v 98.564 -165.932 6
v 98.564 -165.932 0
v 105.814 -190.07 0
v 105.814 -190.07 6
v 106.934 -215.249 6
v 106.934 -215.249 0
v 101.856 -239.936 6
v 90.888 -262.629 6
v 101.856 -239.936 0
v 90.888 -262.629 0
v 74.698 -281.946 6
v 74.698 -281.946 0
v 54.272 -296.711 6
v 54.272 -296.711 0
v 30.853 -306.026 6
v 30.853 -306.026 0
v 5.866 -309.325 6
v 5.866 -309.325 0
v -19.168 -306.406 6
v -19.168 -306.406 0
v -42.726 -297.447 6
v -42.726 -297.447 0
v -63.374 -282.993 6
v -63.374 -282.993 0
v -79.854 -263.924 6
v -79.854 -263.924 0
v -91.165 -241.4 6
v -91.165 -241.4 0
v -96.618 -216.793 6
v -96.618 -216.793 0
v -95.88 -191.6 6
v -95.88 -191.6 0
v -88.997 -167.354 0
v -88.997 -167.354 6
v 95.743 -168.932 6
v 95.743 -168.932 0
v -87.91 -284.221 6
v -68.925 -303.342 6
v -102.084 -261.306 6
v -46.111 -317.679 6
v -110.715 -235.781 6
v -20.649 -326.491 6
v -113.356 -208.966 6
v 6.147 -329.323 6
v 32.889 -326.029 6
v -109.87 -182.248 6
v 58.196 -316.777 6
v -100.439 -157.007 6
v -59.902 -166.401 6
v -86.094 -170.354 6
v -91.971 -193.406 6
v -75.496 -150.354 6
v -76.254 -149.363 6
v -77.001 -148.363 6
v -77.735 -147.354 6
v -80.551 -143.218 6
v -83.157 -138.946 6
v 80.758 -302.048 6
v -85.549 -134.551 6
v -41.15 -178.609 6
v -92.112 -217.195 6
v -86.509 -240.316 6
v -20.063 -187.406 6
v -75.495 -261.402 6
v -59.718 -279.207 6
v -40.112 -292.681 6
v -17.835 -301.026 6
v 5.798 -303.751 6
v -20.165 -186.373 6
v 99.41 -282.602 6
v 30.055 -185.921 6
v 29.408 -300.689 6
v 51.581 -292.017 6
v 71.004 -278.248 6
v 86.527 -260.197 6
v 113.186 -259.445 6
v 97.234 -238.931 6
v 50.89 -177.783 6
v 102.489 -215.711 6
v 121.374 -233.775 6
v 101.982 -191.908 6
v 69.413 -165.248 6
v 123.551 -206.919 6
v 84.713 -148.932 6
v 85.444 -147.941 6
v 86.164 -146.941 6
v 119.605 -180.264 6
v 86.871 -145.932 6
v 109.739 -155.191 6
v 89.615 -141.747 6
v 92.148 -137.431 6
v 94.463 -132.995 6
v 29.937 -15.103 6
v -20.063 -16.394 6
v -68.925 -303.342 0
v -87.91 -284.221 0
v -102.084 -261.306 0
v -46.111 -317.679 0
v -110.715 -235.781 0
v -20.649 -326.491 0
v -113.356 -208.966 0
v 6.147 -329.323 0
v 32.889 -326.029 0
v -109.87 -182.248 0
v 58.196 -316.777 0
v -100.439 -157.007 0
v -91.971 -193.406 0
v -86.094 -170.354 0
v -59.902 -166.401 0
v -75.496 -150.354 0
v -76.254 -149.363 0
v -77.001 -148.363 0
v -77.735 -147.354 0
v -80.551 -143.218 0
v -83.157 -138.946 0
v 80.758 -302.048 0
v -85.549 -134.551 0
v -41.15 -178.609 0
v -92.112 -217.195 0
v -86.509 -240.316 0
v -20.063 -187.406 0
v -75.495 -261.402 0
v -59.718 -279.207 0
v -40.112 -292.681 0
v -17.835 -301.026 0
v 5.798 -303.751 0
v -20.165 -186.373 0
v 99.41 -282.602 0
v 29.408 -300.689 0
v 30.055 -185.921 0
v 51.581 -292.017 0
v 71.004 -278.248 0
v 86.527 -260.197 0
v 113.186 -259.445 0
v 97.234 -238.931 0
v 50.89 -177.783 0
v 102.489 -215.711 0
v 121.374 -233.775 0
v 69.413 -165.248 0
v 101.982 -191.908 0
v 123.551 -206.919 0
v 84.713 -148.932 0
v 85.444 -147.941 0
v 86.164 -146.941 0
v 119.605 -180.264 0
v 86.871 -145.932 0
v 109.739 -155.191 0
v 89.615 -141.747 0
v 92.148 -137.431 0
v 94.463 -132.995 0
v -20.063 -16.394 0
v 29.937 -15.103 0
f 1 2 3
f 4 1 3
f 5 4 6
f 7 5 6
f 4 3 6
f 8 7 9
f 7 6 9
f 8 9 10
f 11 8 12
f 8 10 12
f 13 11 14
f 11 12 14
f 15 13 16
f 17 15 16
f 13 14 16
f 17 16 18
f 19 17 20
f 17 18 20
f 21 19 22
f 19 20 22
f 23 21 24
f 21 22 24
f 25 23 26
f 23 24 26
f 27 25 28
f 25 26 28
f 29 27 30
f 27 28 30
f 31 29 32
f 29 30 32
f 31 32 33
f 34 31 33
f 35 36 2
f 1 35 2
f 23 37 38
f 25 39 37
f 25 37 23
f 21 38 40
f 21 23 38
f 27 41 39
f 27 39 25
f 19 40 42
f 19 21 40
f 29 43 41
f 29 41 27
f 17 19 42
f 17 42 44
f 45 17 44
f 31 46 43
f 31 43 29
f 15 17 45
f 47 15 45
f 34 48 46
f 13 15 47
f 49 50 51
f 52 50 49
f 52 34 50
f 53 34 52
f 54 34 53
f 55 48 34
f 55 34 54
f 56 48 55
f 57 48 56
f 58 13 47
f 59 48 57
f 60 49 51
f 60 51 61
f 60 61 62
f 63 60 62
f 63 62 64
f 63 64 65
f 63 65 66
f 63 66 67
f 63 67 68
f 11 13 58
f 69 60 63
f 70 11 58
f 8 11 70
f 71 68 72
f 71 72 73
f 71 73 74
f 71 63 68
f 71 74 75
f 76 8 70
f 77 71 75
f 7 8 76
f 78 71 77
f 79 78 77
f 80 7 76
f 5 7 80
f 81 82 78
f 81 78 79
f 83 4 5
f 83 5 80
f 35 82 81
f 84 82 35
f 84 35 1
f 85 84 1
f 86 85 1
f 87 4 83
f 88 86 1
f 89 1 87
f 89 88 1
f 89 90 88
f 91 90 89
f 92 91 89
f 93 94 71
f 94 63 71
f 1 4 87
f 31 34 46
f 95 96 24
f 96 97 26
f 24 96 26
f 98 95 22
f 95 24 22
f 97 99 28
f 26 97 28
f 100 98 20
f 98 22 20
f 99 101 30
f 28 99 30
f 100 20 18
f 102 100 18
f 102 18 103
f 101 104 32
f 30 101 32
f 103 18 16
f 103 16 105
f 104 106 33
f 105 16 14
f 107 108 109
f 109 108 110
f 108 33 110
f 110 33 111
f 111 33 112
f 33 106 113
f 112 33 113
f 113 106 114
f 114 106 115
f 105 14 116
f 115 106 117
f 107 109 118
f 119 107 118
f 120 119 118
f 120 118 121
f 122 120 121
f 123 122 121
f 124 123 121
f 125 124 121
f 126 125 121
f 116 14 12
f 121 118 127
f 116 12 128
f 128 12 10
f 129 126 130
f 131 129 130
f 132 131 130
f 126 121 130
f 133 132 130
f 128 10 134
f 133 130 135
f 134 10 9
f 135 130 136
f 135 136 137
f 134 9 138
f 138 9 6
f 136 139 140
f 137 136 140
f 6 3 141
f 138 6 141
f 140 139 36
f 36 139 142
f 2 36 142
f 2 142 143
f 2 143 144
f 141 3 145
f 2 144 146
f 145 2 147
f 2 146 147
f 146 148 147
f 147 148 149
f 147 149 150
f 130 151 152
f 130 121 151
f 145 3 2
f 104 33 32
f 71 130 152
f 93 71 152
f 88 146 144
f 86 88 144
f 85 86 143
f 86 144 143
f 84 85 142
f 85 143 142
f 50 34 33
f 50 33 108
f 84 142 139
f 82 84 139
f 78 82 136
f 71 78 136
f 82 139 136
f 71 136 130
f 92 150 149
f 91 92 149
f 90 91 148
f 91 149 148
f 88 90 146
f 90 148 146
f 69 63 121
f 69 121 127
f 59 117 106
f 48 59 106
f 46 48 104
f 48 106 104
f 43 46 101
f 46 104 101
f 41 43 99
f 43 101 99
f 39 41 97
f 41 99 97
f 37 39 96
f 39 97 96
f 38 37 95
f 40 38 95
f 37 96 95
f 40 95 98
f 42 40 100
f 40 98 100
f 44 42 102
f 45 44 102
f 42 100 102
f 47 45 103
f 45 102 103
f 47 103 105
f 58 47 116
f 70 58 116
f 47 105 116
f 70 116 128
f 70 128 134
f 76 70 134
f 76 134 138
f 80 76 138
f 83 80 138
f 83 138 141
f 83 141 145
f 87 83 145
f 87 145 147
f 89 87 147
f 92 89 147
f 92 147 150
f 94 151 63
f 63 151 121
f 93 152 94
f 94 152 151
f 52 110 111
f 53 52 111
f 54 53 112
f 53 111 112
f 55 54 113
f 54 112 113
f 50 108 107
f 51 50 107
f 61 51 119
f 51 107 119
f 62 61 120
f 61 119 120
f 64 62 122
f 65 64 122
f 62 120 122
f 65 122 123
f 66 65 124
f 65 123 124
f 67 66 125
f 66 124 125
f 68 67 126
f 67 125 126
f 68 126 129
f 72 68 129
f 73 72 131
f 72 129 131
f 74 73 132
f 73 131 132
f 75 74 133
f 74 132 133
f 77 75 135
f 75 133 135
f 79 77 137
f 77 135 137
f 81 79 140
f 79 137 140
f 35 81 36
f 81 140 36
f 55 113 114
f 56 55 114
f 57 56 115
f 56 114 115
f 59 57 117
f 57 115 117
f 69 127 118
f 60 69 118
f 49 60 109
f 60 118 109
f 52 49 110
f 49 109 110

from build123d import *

# Parameters (mm, degrees)
F1_DEPTH = 6


# Not quite as in the source:
# - a feature names something its author has since deleted; it is built from what else it names


with BuildPart() as f1:
    # F0 (on Top) → F1 (new body)
    with BuildSketch(Plane.XY):
        with BuildLine():
            ThreePointArc((30.0553449159, -185.920695897), (17.5794063582, -188.4215241051), (4.8876879096, -189.3289751767))
            Line((4.8876879096, -189.3289751767), (5.7980329658, -303.75093242))
            ThreePointArc((5.7980329658, -303.75093242), (86.5273496986, -260.1965866309), (95.7430891745, -168.9317316034))
            ThreePointArc((95.7430891745, -168.9317316034), (90.8132652561, -158.6088748661), (84.7126559945, -148.9317316034))
            ThreePointArc((84.7126559945, -148.9317316034), (60.5005683745, -172.0314581931), (30.0553449159, -185.920695897))
        make_face()
        with BuildLine():
            ThreePointArc((98.5642250933, -165.9317316034), (90.8814208815, -262.6386931182), (5.8423814985, -309.3251329781))
            ThreePointArc((5.8423814985, -309.3251329781), (-79.8609699448, -263.9139469341), (-88.9966016407, -167.3542218927))
            ThreePointArc((-88.9966016407, -167.3542218927), (-83.929020631, -157.0369391236), (-77.7345321086, -147.3542218927))
            ThreePointArc((-77.7345321086, -147.3542218927), (-81.8805443881, -141.0981193513), (-85.5490516624, -134.5505784994))
            ThreePointArc((-85.5490516624, -134.5505784994), (6.1468085688, -329.3233337338), (94.4628409087, -132.9949471034))
            ThreePointArc((94.4628409087, -132.9949471034), (90.9080384927, -139.6049105385), (86.8707656456, -145.9317316034))
            ThreePointArc((86.8707656456, -145.9317316034), (93.2862540801, -155.5991937575), (98.5642250933, -165.9317316034))
        make_face()
        with BuildLine():
            Line((5.7980329658, -303.75093242), (4.8876879096, -189.3289751767))
            ThreePointArc((4.8876879096, -189.3289751767), (-7.6794152519, -188.6448310467), (-20.0630018523, -186.3982963877))
            Line((-20.0630018523, -186.3982963877), (-20.0630018523, -187.4059048465))
            Line((-20.0630018523, -187.4059048465), (-20.1645397489, -186.3731772774))
            ThreePointArc((-20.1645397489, -186.3731772774), (-50.8661384709, -173.027578246), (-75.4956347969, -150.3542218927))
            ThreePointArc((-75.4956347969, -150.3542218927), (-81.3750972509, -160.0468085115), (-86.0943708707, -170.3542218927))
            ThreePointArc((-86.0943708707, -170.3542218927), (-75.4947572543, -261.4016255971), (5.7980329658, -303.75093242))
        make_face()
        with BuildLine():
            Line((-88.9966016407, -167.3542218927), (-86.0943708707, -170.3542218927))
            ThreePointArc((-86.0943708707, -170.3542218927), (-81.3750972509, -160.0468085115), (-75.4956347969, -150.3542218927))
            ThreePointArc((-75.4956347969, -150.3542218927), (-76.6290258855, -148.8646271178), (-77.7345321086, -147.3542218927))
            ThreePointArc((-77.7345321086, -147.3542218927), (-83.929020631, -157.0369391236), (-88.9966016407, -167.3542218927))
        make_face()
        with BuildLine():
            ThreePointArc((84.7126559945, -148.9317316034), (90.8132652561, -158.6088748661), (95.7430891745, -168.9317316034))
            Line((95.7430891745, -168.9317316034), (98.5642250933, -165.9317316034))
            ThreePointArc((98.5642250933, -165.9317316034), (93.2862540801, -155.5991937575), (86.8707656456, -145.9317316034))
            ThreePointArc((86.8707656456, -145.9317316034), (85.8054753664, -147.4416334036), (84.7126559945, -148.9317316034))
        make_face()
        with BuildLine():
            ThreePointArc((-20.0630018523, -186.3982963877), (-7.6794152519, -188.6448310467), (4.8876879096, -189.3289751767))
            ThreePointArc((4.8876879096, -189.3289751767), (17.5794063582, -188.4215241051), (30.0553449159, -185.920695897))
            Line((30.0553449159, -185.920695897), (29.9369981477, -15.103455868))
            Line((29.9369981477, -15.103455868), (-20.0630018523, -16.3942482322))
            Line((-20.0630018523, -16.3942482322), (-20.0630018523, -186.3982963877))
        make_face()
    extrude(amount=F1_DEPTH)


solid = f1.part
